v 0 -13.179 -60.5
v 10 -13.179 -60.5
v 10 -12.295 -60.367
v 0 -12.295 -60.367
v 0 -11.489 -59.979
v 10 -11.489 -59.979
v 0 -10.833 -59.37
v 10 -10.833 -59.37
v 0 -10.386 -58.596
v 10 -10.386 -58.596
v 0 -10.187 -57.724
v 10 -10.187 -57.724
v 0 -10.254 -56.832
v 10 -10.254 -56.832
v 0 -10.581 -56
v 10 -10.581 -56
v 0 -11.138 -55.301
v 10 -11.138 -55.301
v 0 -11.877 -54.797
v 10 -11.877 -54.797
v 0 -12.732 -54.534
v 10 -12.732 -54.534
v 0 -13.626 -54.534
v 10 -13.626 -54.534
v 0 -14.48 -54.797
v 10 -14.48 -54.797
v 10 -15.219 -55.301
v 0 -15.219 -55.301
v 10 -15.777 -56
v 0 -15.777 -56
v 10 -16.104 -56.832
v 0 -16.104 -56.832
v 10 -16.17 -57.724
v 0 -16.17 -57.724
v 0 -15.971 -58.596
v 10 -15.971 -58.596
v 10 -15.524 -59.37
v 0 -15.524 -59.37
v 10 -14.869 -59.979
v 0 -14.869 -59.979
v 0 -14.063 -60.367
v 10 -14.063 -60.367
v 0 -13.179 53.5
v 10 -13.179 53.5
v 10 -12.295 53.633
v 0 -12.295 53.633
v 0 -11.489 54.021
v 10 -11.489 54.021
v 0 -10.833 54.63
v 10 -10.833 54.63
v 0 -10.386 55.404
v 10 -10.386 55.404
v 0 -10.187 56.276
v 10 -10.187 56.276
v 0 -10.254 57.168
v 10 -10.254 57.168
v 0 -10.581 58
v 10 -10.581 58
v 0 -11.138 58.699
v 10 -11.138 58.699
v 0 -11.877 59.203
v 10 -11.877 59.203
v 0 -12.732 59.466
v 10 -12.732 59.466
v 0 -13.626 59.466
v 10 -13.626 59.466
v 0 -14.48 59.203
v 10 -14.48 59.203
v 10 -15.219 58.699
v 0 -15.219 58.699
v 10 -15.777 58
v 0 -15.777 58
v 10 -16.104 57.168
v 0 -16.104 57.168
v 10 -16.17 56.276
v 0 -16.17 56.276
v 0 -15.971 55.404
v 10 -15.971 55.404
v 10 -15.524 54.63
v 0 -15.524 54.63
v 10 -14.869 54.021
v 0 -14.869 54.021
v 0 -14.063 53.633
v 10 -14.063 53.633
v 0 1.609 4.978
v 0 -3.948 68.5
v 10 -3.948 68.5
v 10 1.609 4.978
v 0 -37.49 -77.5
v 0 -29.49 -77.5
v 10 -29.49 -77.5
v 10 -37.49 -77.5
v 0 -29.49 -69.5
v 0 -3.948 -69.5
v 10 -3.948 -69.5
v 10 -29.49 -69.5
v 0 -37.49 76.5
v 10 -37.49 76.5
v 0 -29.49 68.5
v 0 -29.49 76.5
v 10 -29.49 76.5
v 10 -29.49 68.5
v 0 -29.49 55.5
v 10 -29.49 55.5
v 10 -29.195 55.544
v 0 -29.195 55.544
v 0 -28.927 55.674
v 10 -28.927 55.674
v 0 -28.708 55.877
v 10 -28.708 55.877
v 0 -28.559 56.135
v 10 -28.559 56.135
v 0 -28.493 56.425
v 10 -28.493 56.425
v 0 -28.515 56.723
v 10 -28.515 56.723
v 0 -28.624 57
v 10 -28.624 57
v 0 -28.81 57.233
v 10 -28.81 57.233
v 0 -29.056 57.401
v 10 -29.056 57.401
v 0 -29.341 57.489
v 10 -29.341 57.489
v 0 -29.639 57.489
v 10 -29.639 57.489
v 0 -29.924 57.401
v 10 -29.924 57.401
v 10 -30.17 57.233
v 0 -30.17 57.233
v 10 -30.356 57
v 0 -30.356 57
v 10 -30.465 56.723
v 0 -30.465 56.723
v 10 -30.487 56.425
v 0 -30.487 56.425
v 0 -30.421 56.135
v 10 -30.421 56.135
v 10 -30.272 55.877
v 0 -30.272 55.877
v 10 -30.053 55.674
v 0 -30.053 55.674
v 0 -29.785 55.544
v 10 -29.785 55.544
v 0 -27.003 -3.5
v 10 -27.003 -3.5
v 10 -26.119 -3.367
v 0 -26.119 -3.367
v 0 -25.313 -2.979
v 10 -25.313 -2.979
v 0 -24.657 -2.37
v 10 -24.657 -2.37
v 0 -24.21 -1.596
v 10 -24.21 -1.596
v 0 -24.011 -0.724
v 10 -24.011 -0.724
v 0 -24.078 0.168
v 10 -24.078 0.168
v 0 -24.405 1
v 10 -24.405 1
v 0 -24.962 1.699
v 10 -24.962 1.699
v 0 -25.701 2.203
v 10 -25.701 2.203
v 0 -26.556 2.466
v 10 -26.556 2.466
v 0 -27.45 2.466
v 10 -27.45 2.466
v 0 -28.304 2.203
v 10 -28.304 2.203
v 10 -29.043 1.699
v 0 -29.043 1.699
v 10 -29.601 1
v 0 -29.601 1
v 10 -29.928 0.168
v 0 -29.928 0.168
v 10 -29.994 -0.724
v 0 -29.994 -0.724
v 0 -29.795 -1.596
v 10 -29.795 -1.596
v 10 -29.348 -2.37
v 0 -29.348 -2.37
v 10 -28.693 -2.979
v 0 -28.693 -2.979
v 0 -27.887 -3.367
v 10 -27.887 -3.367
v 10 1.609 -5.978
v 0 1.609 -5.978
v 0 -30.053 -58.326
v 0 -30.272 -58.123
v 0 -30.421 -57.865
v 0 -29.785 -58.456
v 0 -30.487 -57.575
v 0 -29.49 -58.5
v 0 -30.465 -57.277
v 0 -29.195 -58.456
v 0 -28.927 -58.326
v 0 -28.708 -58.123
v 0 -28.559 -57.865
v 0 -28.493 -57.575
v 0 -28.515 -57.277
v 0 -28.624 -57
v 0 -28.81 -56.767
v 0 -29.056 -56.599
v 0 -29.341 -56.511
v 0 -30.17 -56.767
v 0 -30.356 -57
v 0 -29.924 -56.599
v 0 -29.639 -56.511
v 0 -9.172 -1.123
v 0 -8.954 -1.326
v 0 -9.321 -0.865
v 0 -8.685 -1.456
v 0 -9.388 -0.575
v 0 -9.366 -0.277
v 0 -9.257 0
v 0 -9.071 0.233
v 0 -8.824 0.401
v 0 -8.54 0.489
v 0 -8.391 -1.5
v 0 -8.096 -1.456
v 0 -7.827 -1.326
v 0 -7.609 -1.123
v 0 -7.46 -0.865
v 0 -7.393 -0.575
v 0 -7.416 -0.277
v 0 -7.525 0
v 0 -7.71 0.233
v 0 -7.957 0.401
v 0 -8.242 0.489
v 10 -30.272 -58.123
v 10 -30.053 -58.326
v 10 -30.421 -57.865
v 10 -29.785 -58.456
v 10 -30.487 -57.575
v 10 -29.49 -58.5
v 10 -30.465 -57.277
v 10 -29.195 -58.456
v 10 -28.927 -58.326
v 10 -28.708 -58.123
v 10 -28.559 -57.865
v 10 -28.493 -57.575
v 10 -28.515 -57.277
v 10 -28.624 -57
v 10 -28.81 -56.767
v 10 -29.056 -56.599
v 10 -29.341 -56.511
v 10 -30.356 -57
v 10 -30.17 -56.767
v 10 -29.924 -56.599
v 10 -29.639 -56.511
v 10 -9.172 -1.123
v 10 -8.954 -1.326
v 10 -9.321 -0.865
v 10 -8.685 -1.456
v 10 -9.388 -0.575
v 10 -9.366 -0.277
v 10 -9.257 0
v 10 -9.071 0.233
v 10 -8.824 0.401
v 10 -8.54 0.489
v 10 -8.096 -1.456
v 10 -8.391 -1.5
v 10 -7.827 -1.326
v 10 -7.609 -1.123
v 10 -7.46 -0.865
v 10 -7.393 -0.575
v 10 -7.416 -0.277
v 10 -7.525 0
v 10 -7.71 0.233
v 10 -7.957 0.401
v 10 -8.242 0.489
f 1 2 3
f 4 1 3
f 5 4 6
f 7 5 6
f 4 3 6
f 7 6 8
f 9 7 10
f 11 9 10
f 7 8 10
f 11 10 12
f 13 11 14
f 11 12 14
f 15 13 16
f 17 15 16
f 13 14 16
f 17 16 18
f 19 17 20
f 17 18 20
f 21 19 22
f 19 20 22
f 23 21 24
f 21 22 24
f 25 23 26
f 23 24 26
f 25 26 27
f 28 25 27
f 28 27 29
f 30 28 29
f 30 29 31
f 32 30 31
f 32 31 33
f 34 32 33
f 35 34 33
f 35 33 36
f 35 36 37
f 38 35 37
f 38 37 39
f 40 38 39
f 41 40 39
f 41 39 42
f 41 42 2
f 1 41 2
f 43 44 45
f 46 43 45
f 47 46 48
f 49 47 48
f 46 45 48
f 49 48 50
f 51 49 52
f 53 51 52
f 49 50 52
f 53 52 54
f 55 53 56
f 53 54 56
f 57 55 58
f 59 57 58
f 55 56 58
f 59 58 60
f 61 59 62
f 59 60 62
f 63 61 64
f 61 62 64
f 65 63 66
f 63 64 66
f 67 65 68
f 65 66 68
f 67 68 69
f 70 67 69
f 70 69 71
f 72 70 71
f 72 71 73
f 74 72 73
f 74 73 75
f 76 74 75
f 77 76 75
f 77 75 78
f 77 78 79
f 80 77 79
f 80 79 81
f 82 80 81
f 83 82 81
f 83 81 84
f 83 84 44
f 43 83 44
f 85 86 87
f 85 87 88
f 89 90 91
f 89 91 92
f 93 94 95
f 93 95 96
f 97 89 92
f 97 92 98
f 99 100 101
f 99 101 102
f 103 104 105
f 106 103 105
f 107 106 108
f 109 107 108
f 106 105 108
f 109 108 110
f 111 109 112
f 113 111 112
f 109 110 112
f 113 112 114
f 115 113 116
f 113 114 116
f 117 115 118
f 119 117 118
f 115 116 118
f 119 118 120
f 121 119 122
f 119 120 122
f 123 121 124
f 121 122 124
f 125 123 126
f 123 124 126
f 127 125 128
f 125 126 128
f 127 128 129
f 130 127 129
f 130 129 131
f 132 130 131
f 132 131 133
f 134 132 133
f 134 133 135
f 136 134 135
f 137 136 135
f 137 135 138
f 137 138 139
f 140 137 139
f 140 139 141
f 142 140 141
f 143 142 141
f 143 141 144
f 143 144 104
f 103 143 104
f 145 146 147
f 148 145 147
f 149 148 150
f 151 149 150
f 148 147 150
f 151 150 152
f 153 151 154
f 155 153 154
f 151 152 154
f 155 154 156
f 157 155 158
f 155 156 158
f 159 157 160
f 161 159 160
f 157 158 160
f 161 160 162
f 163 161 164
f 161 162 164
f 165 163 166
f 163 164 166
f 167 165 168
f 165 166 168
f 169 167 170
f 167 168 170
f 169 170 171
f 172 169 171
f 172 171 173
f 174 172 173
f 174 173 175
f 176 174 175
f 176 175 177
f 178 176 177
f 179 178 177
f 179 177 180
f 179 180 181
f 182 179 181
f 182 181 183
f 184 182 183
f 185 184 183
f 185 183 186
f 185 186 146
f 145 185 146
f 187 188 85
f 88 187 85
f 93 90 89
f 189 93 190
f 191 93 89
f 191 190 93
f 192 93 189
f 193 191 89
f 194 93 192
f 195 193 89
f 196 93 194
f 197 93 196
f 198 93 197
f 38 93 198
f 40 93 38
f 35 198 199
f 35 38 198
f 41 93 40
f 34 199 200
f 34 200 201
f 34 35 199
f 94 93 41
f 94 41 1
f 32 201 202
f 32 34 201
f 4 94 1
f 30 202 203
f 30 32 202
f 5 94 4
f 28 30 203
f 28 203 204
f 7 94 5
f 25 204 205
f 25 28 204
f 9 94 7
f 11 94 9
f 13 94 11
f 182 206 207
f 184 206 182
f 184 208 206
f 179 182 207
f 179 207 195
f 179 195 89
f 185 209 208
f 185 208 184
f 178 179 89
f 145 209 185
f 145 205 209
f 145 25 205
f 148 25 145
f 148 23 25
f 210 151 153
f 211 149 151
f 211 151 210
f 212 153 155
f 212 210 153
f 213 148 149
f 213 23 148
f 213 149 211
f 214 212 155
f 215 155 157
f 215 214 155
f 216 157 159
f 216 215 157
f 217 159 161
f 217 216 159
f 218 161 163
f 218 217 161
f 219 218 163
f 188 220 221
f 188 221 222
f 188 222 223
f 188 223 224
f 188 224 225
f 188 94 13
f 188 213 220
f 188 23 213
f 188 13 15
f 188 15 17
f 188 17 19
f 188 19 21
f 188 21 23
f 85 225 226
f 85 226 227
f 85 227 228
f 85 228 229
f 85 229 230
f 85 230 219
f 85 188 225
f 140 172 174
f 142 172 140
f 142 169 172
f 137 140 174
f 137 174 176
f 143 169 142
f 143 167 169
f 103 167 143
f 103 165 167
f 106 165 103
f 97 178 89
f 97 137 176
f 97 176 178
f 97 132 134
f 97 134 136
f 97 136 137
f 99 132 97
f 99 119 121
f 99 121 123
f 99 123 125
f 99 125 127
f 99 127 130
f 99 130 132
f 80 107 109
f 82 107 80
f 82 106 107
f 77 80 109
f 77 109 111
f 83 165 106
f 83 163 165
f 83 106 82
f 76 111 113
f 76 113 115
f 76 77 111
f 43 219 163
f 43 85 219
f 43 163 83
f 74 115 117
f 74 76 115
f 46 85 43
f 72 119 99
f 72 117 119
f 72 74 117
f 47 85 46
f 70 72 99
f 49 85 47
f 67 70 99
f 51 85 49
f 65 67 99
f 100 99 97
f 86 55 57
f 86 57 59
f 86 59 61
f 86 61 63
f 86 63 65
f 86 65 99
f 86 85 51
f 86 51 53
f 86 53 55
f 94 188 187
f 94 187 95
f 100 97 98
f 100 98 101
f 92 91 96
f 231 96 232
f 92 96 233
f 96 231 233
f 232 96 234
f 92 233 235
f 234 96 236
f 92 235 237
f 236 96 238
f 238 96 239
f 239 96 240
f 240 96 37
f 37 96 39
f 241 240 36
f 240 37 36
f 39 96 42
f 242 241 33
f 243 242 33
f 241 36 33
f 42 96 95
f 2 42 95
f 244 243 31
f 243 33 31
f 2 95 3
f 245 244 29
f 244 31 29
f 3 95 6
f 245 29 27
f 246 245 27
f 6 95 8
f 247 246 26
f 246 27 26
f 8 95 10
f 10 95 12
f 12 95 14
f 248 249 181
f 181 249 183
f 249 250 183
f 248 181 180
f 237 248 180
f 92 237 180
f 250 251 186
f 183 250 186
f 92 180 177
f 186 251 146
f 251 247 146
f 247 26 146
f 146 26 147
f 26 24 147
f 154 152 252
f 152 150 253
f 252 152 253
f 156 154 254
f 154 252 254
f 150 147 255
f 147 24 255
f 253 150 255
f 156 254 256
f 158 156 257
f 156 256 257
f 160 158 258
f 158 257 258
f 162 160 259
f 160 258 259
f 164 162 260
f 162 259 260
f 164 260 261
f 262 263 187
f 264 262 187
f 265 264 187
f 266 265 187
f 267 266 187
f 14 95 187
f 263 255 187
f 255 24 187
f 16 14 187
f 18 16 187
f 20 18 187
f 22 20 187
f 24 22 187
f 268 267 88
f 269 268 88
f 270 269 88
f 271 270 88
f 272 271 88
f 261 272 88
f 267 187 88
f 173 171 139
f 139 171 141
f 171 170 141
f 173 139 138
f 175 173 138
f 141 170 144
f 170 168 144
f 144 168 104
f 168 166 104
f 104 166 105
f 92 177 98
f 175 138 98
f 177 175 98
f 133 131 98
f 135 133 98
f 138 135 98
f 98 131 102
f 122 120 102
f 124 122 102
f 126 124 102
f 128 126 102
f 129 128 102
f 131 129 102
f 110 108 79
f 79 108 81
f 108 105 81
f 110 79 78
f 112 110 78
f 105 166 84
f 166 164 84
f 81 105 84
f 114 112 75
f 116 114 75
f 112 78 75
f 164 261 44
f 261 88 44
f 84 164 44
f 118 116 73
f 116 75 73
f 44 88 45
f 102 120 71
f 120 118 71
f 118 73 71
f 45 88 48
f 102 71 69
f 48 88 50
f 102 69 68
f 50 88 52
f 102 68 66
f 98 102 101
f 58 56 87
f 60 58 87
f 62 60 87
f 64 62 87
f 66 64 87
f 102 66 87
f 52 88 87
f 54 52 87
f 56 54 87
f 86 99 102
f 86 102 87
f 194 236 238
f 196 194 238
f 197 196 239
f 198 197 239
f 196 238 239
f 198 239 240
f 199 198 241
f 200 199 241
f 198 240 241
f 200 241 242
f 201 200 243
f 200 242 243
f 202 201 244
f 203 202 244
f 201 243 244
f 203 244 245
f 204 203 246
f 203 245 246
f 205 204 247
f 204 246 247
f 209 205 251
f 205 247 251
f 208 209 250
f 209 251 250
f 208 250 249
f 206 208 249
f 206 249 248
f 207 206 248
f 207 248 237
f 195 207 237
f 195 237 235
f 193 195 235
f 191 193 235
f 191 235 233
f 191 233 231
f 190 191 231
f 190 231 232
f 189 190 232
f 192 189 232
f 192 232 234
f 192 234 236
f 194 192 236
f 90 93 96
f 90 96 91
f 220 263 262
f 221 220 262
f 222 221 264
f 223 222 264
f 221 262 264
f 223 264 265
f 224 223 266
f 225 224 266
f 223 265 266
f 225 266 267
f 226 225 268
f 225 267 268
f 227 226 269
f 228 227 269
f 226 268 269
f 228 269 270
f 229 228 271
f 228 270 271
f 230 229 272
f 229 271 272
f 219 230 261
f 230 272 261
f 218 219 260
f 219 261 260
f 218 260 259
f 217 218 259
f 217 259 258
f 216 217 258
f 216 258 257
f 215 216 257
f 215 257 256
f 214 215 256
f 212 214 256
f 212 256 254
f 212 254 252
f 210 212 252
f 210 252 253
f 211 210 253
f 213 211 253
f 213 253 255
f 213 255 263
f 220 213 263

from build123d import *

# Parameters (mm, degrees)
RESSALTO_EXTRUS_O2_DEPTH = 10
ESBO_O3_R                = 1
ESBO_O3_R_2              = 3
CORTE_EXTRUS_O1_DEPTH    = 87.670292346


with BuildPart() as part:
    # Esboço2 → Ressalto-extrusão2 (new body)
    with BuildSketch(Plane(origin=(0, 0, 0), x_dir=(0, 0, -1), z_dir=(1, 0, 0))):
        Polygon((69.5, -29.489859634), (77.5, -29.489859634), (77.5, -37.489859634), (-76.5, -37.489859634), (-76.5, -29.489859634), (-68.5, -29.489859634), (-68.5, -3.948025217), (-4.978169529, 1.609414836), (0, 1.609414836), (5.978169529, 1.609414836), (69.5, -3.948025217), align=None)
    extrude(amount=RESSALTO_EXTRUS_O2_DEPTH)

    # Esboço3 → Corte-extrusão1 (cut, through all)
    with BuildSketch(Plane(origin=(10, 0, 0), x_dir=(0, 0, -1), z_dir=(1, 0, 0))):
        with Locations((0.5, -8.390585169)):
            Circle(ESBO_O3_R)
        with Locations((0.5, -27.002843355)):
            Circle(ESBO_O3_R_2)
        with Locations((57.5, -13.178770401)):
            Circle(ESBO_O3_R_2)
        with Locations((57.5, -29.489859634)):
            Circle(ESBO_O3_R)
        with Locations((-56.5, -13.178770401)):
            Circle(ESBO_O3_R_2)
        with Locations((-56.5, -29.489859634)):
            Circle(ESBO_O3_R)
    extrude(amount=-CORTE_EXTRUS_O1_DEPTH, mode=Mode.SUBTRACT)


solid = part.part
